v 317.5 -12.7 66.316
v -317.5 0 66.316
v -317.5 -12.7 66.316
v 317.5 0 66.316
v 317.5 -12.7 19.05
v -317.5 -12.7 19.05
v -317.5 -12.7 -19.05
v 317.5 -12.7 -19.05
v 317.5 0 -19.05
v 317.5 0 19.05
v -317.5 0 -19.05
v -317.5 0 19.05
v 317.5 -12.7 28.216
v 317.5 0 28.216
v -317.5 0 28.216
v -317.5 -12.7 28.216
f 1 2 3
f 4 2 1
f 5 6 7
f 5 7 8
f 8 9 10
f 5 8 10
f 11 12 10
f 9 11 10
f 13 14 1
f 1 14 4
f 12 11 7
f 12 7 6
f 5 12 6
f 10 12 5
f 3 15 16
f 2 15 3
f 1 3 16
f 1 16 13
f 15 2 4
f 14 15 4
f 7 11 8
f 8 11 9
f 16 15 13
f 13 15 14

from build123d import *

# Parameters (mm, degrees)
F0_W     = 635
F0_H     = 38.1
F1_DEPTH = 12.7


with BuildPart() as f1:
    # F0 (on Front) → F1 (new body)
    with BuildSketch(Plane.XZ):
        with Locations((0, 47.266053)):
            Rectangle(F0_W, F0_H)
        Rectangle(F0_W, F0_H)
    extrude(amount=F1_DEPTH)


solid = f1.part
